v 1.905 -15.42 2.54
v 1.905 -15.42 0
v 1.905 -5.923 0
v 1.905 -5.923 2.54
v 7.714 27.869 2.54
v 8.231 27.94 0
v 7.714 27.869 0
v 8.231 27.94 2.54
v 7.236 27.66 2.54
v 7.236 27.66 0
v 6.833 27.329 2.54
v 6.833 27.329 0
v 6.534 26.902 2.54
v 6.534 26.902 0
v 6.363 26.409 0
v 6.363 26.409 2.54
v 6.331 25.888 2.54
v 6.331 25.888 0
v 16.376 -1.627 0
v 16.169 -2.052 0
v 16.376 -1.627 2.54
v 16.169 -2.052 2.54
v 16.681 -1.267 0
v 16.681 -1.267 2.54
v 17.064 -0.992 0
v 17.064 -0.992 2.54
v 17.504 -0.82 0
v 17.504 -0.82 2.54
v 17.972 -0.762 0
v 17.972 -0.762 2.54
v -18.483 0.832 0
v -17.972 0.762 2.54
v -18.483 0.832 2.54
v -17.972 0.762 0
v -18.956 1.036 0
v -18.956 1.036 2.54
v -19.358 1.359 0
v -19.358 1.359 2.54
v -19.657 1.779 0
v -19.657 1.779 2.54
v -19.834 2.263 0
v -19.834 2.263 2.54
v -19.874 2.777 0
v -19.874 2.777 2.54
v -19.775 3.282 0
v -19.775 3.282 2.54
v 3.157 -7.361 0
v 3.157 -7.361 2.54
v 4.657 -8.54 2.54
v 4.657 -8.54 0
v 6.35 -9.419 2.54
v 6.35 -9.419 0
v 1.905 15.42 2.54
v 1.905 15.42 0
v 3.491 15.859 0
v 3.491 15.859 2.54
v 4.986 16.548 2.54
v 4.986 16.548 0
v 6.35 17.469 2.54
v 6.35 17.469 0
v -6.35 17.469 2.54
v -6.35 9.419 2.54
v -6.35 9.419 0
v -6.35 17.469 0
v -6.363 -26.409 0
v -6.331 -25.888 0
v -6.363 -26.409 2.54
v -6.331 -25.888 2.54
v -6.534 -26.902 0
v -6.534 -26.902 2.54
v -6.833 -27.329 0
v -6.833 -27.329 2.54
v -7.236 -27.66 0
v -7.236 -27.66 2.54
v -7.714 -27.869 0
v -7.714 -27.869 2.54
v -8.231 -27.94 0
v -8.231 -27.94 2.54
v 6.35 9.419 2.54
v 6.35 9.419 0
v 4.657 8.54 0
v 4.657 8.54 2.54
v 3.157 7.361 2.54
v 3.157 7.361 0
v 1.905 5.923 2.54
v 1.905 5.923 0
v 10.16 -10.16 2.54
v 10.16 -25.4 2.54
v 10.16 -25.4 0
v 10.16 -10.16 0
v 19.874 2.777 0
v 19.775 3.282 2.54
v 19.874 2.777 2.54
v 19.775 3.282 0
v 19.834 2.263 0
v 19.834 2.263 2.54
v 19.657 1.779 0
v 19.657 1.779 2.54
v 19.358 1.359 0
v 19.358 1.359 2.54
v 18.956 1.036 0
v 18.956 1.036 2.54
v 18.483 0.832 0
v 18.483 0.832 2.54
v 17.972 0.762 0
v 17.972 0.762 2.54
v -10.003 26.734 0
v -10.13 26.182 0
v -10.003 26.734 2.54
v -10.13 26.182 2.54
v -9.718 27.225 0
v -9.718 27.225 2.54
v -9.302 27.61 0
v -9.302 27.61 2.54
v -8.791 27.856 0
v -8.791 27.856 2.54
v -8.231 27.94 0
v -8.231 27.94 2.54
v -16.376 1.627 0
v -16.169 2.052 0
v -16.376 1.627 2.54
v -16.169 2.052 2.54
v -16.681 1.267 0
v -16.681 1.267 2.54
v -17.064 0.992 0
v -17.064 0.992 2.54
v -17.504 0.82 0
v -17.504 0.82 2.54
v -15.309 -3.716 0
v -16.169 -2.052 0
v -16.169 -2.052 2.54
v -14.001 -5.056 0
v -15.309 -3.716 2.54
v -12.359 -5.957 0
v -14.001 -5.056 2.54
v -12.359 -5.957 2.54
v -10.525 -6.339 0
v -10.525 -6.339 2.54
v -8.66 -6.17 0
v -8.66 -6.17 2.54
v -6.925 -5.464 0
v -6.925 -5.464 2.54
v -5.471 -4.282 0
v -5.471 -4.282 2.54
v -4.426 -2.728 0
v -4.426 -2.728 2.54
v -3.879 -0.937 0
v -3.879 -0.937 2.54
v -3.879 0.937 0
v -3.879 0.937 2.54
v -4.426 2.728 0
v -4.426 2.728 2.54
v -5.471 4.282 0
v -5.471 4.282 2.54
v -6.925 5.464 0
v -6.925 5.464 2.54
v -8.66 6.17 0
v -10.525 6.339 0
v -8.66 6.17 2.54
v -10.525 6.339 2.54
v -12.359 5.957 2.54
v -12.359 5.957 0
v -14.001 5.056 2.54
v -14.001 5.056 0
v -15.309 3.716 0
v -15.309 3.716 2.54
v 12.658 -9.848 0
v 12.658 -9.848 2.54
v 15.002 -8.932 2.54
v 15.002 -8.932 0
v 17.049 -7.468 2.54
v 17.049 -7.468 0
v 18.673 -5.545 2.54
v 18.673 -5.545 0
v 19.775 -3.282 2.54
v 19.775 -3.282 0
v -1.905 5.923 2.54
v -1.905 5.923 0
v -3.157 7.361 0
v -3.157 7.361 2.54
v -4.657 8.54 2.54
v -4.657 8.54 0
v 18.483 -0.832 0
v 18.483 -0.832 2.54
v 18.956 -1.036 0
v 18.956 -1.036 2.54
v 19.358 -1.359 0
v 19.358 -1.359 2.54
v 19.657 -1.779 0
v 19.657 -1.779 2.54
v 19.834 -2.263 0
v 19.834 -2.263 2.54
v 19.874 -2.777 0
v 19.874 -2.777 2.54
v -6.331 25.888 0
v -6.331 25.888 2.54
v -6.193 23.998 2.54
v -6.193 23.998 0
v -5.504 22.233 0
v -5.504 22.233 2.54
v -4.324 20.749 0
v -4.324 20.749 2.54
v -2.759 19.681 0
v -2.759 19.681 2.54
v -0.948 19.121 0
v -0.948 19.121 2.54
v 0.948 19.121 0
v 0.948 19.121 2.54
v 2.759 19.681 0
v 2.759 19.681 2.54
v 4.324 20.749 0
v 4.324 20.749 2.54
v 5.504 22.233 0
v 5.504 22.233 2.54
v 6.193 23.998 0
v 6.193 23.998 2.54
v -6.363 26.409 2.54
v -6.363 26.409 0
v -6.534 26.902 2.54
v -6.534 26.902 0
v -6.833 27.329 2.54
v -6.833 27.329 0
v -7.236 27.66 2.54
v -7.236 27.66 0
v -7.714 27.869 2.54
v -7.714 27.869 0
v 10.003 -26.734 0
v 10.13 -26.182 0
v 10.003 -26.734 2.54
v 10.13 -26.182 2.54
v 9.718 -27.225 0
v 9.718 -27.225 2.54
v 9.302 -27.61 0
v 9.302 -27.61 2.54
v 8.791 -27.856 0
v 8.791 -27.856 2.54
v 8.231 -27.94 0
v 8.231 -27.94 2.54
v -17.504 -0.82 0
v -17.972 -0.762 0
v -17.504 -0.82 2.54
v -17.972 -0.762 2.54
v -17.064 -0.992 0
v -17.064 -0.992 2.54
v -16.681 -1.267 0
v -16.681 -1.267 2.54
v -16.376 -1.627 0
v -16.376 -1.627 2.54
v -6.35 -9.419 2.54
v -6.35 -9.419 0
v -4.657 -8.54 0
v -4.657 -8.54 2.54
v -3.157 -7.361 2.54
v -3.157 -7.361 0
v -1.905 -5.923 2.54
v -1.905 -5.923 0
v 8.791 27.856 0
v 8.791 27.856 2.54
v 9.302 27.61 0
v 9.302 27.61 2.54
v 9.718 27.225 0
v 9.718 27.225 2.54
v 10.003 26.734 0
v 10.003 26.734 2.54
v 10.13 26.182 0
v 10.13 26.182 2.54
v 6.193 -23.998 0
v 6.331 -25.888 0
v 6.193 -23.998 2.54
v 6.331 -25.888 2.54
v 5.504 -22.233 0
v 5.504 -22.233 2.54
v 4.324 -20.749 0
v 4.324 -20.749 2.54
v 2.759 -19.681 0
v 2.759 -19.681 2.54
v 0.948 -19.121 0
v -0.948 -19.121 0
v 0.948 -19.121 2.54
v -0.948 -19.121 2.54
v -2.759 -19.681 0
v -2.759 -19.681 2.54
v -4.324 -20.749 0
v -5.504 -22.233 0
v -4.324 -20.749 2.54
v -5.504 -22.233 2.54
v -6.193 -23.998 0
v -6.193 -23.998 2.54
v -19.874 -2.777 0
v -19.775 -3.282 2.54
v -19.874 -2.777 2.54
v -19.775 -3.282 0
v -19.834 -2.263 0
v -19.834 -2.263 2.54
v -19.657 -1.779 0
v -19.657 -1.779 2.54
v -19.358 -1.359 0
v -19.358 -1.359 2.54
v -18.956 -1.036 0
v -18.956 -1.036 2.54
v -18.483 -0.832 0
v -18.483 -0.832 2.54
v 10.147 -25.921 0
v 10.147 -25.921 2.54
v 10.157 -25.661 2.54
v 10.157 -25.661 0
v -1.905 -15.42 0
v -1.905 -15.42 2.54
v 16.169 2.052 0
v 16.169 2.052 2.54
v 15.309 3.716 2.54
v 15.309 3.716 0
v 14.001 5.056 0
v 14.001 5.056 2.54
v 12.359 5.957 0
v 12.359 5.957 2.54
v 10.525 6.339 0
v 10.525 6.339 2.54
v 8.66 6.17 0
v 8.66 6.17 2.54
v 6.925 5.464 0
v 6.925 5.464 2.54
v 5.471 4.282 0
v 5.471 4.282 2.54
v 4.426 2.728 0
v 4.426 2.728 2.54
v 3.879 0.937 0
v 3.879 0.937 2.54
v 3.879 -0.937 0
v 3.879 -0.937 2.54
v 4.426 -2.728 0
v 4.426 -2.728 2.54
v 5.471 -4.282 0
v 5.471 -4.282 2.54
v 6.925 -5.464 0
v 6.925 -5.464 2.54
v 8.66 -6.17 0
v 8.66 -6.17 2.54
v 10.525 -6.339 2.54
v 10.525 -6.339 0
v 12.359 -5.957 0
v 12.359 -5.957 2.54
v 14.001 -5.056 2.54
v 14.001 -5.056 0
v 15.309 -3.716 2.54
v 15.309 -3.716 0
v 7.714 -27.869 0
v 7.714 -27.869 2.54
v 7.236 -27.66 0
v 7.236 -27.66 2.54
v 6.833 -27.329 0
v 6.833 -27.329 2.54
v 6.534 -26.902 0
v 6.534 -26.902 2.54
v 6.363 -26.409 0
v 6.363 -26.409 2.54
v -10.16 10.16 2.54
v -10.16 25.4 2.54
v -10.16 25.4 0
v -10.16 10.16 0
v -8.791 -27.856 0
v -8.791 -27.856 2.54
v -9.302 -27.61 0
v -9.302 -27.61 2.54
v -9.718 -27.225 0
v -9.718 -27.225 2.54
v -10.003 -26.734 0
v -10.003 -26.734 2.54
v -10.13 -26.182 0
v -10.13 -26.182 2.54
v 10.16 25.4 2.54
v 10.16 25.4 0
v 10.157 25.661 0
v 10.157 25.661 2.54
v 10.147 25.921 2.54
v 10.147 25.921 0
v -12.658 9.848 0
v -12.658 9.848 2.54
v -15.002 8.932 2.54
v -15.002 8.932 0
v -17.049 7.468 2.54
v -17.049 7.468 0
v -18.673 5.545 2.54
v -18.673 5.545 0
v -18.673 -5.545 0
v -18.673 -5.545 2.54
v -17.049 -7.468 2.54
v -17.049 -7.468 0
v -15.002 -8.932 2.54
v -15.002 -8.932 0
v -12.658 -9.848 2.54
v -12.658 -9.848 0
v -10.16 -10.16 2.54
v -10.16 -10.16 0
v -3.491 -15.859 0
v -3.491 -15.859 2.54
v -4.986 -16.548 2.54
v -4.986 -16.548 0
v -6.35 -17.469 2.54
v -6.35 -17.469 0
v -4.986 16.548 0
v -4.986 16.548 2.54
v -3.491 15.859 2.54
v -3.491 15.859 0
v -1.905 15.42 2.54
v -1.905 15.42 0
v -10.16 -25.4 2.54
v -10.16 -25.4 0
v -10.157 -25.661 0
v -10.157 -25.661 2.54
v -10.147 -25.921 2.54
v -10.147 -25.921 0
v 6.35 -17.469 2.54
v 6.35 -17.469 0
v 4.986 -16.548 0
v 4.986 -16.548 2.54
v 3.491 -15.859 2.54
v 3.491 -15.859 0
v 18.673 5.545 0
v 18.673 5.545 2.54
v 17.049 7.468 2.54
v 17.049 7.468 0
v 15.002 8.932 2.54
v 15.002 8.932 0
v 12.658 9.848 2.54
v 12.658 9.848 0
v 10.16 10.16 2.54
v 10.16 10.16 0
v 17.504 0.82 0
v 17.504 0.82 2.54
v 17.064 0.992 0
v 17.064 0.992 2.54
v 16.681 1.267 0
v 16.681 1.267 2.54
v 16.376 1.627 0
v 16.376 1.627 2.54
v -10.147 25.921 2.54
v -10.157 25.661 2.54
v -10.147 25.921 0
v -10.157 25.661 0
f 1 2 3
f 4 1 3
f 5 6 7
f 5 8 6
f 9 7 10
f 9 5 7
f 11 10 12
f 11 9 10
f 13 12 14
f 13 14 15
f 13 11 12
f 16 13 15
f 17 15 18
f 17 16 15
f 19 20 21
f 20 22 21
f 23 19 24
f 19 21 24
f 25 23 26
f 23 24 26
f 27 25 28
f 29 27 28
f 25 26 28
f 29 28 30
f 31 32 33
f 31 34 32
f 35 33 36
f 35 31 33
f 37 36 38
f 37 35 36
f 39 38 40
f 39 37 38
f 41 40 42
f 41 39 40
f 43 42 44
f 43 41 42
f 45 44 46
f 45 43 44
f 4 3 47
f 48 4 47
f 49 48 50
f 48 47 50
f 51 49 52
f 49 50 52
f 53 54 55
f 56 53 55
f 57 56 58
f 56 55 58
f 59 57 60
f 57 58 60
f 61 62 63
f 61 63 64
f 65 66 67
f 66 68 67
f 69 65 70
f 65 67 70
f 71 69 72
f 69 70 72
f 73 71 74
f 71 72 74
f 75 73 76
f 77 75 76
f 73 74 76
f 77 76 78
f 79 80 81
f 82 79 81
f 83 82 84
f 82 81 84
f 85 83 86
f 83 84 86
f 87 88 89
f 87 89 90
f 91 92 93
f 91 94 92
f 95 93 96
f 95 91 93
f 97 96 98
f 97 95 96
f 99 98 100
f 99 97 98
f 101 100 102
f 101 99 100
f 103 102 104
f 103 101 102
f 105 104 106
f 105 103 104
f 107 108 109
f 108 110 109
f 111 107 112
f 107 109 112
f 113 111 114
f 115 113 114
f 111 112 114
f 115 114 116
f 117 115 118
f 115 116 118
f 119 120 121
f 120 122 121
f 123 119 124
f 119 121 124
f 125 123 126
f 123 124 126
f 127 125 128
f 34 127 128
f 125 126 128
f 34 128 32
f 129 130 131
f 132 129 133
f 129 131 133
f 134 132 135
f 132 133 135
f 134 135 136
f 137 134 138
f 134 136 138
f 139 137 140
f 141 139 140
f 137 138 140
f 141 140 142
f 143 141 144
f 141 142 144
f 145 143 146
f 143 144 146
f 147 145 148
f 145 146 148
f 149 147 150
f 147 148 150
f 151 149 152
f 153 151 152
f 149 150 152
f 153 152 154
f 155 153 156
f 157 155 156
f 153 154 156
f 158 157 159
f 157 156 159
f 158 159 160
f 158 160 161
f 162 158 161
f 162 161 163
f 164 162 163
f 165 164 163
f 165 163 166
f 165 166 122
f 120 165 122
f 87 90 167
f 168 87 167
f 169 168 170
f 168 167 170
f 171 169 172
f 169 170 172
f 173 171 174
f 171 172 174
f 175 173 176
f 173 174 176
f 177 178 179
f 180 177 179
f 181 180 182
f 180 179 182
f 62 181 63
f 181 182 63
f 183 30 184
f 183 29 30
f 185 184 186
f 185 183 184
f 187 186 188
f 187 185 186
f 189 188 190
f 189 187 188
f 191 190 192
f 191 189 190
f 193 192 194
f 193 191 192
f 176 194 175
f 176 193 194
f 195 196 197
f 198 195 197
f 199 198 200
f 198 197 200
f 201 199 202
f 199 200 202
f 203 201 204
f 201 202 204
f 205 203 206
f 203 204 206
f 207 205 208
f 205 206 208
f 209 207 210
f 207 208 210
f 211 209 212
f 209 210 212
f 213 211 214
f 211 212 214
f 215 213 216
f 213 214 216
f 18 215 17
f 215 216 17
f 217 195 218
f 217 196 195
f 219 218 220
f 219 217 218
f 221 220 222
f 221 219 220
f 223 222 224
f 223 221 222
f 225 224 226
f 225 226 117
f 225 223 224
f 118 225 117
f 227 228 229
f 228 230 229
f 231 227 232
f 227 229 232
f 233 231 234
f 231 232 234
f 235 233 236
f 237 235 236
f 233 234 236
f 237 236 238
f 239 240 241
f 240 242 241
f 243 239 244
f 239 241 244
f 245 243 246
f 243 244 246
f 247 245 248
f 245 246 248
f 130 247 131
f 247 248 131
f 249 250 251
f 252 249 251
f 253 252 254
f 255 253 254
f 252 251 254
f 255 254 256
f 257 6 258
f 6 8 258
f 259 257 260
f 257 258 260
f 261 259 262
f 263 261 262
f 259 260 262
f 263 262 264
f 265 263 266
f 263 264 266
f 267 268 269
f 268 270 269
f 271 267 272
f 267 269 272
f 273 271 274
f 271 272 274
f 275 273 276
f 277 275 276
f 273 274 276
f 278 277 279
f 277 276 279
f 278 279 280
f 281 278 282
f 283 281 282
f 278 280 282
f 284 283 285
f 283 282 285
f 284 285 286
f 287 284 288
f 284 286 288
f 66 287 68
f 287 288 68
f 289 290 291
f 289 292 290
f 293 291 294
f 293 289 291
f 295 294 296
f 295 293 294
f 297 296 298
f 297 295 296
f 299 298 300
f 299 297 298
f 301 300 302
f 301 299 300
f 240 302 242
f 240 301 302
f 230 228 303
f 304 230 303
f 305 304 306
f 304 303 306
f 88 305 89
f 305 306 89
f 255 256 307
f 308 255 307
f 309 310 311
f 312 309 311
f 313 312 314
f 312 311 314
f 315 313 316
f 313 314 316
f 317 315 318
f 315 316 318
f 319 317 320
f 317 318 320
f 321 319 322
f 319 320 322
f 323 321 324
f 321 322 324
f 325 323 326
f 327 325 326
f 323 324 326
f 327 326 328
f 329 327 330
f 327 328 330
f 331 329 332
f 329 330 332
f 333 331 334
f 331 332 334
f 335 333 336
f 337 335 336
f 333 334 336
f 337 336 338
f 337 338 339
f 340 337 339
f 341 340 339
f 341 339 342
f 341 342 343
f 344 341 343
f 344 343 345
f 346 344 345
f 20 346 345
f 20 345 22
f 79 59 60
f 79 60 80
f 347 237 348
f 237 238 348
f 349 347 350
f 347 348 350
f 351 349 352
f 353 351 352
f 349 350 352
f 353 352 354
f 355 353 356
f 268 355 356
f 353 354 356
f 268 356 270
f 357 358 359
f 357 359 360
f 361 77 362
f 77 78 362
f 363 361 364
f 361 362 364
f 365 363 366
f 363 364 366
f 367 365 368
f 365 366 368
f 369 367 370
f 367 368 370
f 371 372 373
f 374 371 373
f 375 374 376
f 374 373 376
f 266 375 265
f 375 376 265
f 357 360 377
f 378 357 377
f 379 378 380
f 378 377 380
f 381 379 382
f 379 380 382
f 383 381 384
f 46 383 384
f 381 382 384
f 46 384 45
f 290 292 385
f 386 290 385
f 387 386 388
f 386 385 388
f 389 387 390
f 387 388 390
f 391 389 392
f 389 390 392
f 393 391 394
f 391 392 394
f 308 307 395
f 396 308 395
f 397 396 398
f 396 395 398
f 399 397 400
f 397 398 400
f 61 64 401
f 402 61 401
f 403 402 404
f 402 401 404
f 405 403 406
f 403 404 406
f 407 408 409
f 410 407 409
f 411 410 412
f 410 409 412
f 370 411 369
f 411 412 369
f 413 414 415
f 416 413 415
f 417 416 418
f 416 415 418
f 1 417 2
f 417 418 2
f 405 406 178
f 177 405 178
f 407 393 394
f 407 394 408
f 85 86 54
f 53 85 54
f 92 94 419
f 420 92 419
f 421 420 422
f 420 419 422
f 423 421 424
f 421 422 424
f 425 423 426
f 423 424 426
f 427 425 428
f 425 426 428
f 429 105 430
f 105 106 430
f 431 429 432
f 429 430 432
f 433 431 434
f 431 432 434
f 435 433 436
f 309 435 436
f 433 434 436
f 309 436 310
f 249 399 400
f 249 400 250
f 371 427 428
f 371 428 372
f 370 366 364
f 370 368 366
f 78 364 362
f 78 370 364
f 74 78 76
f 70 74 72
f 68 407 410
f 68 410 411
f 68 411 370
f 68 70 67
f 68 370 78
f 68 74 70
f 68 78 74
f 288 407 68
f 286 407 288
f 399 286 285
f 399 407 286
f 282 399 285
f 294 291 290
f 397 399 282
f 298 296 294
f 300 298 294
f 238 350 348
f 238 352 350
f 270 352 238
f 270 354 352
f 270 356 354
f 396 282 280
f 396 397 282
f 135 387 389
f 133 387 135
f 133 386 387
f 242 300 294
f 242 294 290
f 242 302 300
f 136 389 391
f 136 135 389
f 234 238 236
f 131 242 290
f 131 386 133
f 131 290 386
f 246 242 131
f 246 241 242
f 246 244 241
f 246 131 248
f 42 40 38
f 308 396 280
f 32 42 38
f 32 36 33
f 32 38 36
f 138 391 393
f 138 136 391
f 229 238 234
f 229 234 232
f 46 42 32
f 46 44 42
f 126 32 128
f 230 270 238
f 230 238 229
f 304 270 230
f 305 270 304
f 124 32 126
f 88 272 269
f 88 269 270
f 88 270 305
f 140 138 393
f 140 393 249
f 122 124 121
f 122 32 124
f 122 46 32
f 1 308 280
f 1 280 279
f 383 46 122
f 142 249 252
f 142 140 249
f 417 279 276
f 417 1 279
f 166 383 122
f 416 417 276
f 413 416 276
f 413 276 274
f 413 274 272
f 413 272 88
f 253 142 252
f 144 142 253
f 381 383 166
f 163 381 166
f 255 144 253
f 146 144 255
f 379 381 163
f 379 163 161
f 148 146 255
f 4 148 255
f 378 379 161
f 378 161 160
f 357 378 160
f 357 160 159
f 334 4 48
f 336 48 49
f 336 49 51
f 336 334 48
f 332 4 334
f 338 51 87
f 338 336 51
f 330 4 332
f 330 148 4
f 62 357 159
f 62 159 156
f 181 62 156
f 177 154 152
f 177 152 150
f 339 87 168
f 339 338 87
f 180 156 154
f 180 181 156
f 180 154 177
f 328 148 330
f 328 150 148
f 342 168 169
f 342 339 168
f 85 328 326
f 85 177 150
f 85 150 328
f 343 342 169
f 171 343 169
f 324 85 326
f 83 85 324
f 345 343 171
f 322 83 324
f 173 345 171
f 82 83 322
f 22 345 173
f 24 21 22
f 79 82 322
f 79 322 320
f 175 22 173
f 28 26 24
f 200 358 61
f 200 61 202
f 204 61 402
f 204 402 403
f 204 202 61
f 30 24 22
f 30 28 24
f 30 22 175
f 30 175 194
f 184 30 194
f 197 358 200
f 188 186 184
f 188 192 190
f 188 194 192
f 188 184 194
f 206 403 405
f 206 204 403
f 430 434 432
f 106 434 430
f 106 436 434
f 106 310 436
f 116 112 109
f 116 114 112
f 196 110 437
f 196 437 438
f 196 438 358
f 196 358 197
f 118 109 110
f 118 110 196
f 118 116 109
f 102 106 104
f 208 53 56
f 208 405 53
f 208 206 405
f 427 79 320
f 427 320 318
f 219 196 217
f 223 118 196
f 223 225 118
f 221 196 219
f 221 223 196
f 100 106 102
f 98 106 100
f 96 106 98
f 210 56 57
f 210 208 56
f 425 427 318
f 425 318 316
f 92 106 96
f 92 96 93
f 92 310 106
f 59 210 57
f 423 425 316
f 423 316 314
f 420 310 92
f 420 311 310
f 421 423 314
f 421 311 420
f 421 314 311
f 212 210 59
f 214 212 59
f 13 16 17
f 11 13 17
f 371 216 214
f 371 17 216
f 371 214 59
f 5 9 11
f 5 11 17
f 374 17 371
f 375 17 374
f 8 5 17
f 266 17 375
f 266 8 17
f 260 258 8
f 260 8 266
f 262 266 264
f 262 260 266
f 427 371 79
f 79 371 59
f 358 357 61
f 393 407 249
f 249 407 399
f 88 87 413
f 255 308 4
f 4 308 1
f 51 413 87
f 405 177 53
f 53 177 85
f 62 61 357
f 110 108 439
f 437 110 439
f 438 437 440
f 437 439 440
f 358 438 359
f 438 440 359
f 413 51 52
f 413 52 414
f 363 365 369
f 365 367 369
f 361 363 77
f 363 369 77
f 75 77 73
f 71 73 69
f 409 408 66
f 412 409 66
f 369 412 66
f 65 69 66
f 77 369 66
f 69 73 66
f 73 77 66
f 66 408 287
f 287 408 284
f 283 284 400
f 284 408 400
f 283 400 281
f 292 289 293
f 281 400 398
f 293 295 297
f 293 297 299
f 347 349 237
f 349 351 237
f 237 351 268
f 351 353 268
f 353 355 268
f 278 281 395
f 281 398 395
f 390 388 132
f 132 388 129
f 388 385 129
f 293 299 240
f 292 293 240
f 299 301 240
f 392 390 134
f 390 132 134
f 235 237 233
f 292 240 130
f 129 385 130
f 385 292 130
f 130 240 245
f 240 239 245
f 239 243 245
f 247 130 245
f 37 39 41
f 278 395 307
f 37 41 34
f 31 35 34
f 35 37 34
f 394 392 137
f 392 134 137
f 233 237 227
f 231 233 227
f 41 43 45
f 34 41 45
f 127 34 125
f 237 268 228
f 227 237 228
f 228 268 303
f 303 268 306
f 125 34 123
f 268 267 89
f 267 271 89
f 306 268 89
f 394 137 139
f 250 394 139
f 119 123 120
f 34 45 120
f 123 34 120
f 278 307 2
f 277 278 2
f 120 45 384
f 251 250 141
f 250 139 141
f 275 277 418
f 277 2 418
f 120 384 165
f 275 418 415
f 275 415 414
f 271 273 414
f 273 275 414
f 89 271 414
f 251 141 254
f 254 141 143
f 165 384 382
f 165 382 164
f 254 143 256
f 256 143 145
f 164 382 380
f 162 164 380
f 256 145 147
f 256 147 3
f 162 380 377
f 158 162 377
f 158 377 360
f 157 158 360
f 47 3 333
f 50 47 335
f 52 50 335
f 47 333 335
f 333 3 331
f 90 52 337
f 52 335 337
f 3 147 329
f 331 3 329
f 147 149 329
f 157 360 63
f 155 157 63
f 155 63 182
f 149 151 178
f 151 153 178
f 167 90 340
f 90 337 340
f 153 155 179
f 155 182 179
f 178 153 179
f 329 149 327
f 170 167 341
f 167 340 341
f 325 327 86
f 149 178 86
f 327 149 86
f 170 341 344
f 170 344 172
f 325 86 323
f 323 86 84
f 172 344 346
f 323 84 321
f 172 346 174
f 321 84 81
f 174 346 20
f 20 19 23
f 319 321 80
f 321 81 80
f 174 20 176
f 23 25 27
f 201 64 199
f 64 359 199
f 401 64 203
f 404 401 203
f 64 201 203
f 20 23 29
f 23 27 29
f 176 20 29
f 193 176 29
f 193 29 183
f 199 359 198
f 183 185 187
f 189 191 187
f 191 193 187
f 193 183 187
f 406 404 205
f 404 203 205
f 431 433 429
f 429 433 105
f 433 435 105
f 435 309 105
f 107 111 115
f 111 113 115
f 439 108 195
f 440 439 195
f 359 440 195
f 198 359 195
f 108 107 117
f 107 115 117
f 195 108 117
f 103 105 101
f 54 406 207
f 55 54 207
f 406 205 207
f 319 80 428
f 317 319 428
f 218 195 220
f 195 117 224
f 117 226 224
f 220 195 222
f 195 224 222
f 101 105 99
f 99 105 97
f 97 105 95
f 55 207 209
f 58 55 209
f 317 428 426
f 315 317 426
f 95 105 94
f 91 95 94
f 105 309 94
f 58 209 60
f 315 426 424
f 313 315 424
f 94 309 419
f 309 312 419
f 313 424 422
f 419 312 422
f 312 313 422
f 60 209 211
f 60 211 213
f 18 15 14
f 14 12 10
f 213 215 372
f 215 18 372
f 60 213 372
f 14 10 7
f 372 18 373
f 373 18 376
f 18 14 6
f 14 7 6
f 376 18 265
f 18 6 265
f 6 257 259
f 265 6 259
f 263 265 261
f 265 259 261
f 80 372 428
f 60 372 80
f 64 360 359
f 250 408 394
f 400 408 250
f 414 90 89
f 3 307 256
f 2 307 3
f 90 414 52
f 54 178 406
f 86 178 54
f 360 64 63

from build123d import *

# Parameters (mm, degrees)
F1_DEPTH = 2.54
F2_R     = 6.35
F3_DEPTH = 25.4
F5_DEPTH = 2.54
F6_W     = 18.9905706793
F6_H     = 1.524
F7_DEPTH = 25.4
F8_R     = 1.90499


# Not quite as in the source:
# - a fillet or chamfer is up to 0.001 mm smaller than in the source, because OpenCascade refuses the exact size


with BuildPart() as f1:
    # F0 (on Top) → F1 (new body)
    with BuildSketch(Plane.XY):
        with BuildLine():
            Line((9.8373776994, 27.94), (-9.8373776994, 27.94))
            ThreePointArc((-9.8373776994, 27.94), (-8.5823807234, 19.962322084), (-1.905, 15.4201916351))
            Line((-1.905, 15.4201916351), (-1.905, 25.4))
            Line((-1.905, 25.4), (1.905, 25.4))
            Line((1.905, 25.4), (1.905, 15.4201916351))
            ThreePointArc((1.905, 15.4201916351), (8.5823807234, 19.962322084), (9.8373776994, 27.94))
        make_face()
        with BuildLine():
            Line((-1.905, 25.4), (-1.905, 15.4201916351))
            ThreePointArc((-1.905, 15.4201916351), (0, 15.24), (1.905, 15.4201916351))
            Line((1.905, 15.4201916351), (1.905, 25.4))
            Line((1.905, 25.4), (-1.905, 25.4))
        make_face()
        with BuildLine():
            ThreePointArc((1.905, 15.4201916351), (0, 15.24), (-1.905, 15.4201916351))
            Line((-1.905, 15.4201916351), (-1.905, 5.9228856987))
            ThreePointArc((-1.905, 5.9228856987), (-0.4879681556, 3.1108519733), (0, 0))
            ThreePointArc((0, 0), (0.4879681556, 3.1108519733), (1.905, 5.9228856987))
            Line((1.905, 5.9228856987), (1.905, 15.4201916351))
        make_face()
        with BuildLine():
            ThreePointArc((0, 0), (-0.4879681556, 3.1108519733), (-1.905, 5.9228856987))
            Line((-1.905, 5.9228856987), (-1.905, -5.9228856987))
            ThreePointArc((-1.905, -5.9228856987), (-0.4879681556, -3.1108519733), (0, 0))
        make_face()
        with BuildLine():
            Line((-1.905, -5.9228856987), (-1.905, 5.9228856987))
            ThreePointArc((-1.905, 5.9228856987), (-20.32, 0), (-1.905, -5.9228856987))
        make_face()
        with BuildLine():
            ThreePointArc((20.32, 0), (13.2708519733, 9.6720318444), (1.905, 5.9228856987))
            Line((1.905, 5.9228856987), (1.905, -5.9228856987))
            ThreePointArc((1.905, -5.9228856987), (13.2708519733, -9.6720318444), (20.32, 0))
        make_face()
        with BuildLine():
            Line((1.905, -5.9228856987), (1.905, 5.9228856987))
            ThreePointArc((1.905, 5.9228856987), (0.4879681556, 3.1108519733), (0, 0))
            ThreePointArc((0, 0), (0.4879681556, -3.1108519733), (1.905, -5.9228856987))
        make_face()
        with BuildLine():
            ThreePointArc((0, 0), (-0.4879681556, -3.1108519733), (-1.905, -5.9228856987))
            Line((-1.905, -5.9228856987), (-1.905, -15.4201916351))
            ThreePointArc((-1.905, -15.4201916351), (0, -15.24), (1.905, -15.4201916351))
            Line((1.905, -15.4201916351), (1.905, -5.9228856987))
            ThreePointArc((1.905, -5.9228856987), (0.4879681556, -3.1108519733), (0, 0))
        make_face()
        with BuildLine():
            Line((-1.905, -25.4), (-1.905, -15.4201916351))
            ThreePointArc((-1.905, -15.4201916351), (-8.5823807234, -19.962322084), (-9.8373776994, -27.94))
            Line((-9.8373776994, -27.94), (9.8373776994, -27.94))
            ThreePointArc((9.8373776994, -27.94), (8.5823807234, -19.962322084), (1.905, -15.4201916351))
            Line((1.905, -15.4201916351), (1.905, -25.4))
            Line((1.905, -25.4), (-1.905, -25.4))
        make_face()
        with BuildLine():
            ThreePointArc((1.905, -15.4201916351), (0, -15.24), (-1.905, -15.4201916351))
            Line((-1.905, -15.4201916351), (-1.905, -25.4))
            Line((-1.905, -25.4), (1.905, -25.4))
            Line((1.905, -25.4), (1.905, -15.4201916351))
        make_face()
    extrude(amount=F1_DEPTH)

    # F2 (on face) → F3 (cut)
    with BuildSketch(Plane.XY.offset(2.54)):
        with Locations((0, 25.4)):
            Circle(F2_R)
        with Locations((10.16, 0)):
            Circle(F2_R)
        with Locations((-10.16, 0)):
            Circle(F2_R)
        with Locations((0, -25.4)):
            Circle(F2_R)
    extrude(amount=-F3_DEPTH, mode=Mode.SUBTRACT)

    # F4 (on face) → F5 (join, through all)
    with BuildSketch(Plane.XY.offset(2.54)):
        with BuildLine():
            ThreePointArc((6.35, -17.468852542), (9.1581002397, -21.0005909488), (10.16, -25.4))
            Line((10.16, -25.4), (10.16, -10.16))
            ThreePointArc((10.16, -10.16), (8.2192646134, -9.9729206434), (6.35, -9.4185720786))
            Line((6.35, -9.4185720786), (6.35, -17.468852542))
        make_face()
        with BuildLine():
            ThreePointArc((-10.16, -25.4), (-9.1581002397, -21.0005909488), (-6.35, -17.468852542))
            Line((-6.35, -17.468852542), (-6.35, -9.4185720786))
            ThreePointArc((-6.35, -9.4185720786), (-8.2192646134, -9.9729206434), (-10.16, -10.16))
            Line((-10.16, -10.16), (-10.16, -25.4))
        make_face()
        with BuildLine():
            Line((10.16, 10.16), (10.16, 25.4))
            ThreePointArc((10.16, 25.4), (9.1581002397, 21.0005909488), (6.35, 17.468852542))
            Line((6.35, 17.468852542), (6.35, 9.4185720786))
            ThreePointArc((6.35, 9.4185720786), (8.2192646134, 9.9729206434), (10.16, 10.16))
        make_face()
        with BuildLine():
            ThreePointArc((-6.35, 17.468852542), (-9.1581002397, 21.0005909488), (-10.16, 25.4))
            Line((-10.16, 25.4), (-10.16, 10.16))
            ThreePointArc((-10.16, 10.16), (-8.2192646134, 9.9729206434), (-6.35, 9.4185720786))
            Line((-6.35, 9.4185720786), (-6.35, 17.468852542))
        make_face()
    extrude(amount=-F5_DEPTH)

    # F6 (on face) → F7 (cut)
    with BuildSketch(Plane.XY.offset(2.54)):
        with Locations((19.6552853397, 0)):
            Rectangle(F6_W, F6_H)
        with Locations((-19.6552853397, 0)):
            Rectangle(F6_W, F6_H)
    extrude(amount=-F7_DEPTH, mode=Mode.SUBTRACT)

    # F8 (radius 1.905 in the source; OpenCascade refuses exactly that, so slightly less here)
    f8_edges = [f1.edges().sort_by_distance(p)[0] for p in [
        (20.291385, -0.762, 1.27),
        (20.291385, 0.762, 1.27),
        (16.464114, -0.762, 1.27),
        (16.464114, 0.762, 1.27),
        (5.819871, -27.94, 1.27),
        (-5.819871, -27.94, 1.27),
        (9.837378, -27.94, 1.27),
        (-20.291385, 0.762, 1.27),
        (-20.291385, -0.762, 1.27),
        (-16.464114, -0.762, 1.27),
        (-16.464114, 0.762, 1.27),
        (-9.837378, 27.94, 1.27),
        (5.819871, 27.94, 1.27),
        (-5.819871, 27.94, 1.27),
        (9.837378, 27.94, 1.27),
        (-9.837378, -27.94, 1.27),
    ]]
    fillet(f8_edges, radius=F8_R)


solid = f1.part
